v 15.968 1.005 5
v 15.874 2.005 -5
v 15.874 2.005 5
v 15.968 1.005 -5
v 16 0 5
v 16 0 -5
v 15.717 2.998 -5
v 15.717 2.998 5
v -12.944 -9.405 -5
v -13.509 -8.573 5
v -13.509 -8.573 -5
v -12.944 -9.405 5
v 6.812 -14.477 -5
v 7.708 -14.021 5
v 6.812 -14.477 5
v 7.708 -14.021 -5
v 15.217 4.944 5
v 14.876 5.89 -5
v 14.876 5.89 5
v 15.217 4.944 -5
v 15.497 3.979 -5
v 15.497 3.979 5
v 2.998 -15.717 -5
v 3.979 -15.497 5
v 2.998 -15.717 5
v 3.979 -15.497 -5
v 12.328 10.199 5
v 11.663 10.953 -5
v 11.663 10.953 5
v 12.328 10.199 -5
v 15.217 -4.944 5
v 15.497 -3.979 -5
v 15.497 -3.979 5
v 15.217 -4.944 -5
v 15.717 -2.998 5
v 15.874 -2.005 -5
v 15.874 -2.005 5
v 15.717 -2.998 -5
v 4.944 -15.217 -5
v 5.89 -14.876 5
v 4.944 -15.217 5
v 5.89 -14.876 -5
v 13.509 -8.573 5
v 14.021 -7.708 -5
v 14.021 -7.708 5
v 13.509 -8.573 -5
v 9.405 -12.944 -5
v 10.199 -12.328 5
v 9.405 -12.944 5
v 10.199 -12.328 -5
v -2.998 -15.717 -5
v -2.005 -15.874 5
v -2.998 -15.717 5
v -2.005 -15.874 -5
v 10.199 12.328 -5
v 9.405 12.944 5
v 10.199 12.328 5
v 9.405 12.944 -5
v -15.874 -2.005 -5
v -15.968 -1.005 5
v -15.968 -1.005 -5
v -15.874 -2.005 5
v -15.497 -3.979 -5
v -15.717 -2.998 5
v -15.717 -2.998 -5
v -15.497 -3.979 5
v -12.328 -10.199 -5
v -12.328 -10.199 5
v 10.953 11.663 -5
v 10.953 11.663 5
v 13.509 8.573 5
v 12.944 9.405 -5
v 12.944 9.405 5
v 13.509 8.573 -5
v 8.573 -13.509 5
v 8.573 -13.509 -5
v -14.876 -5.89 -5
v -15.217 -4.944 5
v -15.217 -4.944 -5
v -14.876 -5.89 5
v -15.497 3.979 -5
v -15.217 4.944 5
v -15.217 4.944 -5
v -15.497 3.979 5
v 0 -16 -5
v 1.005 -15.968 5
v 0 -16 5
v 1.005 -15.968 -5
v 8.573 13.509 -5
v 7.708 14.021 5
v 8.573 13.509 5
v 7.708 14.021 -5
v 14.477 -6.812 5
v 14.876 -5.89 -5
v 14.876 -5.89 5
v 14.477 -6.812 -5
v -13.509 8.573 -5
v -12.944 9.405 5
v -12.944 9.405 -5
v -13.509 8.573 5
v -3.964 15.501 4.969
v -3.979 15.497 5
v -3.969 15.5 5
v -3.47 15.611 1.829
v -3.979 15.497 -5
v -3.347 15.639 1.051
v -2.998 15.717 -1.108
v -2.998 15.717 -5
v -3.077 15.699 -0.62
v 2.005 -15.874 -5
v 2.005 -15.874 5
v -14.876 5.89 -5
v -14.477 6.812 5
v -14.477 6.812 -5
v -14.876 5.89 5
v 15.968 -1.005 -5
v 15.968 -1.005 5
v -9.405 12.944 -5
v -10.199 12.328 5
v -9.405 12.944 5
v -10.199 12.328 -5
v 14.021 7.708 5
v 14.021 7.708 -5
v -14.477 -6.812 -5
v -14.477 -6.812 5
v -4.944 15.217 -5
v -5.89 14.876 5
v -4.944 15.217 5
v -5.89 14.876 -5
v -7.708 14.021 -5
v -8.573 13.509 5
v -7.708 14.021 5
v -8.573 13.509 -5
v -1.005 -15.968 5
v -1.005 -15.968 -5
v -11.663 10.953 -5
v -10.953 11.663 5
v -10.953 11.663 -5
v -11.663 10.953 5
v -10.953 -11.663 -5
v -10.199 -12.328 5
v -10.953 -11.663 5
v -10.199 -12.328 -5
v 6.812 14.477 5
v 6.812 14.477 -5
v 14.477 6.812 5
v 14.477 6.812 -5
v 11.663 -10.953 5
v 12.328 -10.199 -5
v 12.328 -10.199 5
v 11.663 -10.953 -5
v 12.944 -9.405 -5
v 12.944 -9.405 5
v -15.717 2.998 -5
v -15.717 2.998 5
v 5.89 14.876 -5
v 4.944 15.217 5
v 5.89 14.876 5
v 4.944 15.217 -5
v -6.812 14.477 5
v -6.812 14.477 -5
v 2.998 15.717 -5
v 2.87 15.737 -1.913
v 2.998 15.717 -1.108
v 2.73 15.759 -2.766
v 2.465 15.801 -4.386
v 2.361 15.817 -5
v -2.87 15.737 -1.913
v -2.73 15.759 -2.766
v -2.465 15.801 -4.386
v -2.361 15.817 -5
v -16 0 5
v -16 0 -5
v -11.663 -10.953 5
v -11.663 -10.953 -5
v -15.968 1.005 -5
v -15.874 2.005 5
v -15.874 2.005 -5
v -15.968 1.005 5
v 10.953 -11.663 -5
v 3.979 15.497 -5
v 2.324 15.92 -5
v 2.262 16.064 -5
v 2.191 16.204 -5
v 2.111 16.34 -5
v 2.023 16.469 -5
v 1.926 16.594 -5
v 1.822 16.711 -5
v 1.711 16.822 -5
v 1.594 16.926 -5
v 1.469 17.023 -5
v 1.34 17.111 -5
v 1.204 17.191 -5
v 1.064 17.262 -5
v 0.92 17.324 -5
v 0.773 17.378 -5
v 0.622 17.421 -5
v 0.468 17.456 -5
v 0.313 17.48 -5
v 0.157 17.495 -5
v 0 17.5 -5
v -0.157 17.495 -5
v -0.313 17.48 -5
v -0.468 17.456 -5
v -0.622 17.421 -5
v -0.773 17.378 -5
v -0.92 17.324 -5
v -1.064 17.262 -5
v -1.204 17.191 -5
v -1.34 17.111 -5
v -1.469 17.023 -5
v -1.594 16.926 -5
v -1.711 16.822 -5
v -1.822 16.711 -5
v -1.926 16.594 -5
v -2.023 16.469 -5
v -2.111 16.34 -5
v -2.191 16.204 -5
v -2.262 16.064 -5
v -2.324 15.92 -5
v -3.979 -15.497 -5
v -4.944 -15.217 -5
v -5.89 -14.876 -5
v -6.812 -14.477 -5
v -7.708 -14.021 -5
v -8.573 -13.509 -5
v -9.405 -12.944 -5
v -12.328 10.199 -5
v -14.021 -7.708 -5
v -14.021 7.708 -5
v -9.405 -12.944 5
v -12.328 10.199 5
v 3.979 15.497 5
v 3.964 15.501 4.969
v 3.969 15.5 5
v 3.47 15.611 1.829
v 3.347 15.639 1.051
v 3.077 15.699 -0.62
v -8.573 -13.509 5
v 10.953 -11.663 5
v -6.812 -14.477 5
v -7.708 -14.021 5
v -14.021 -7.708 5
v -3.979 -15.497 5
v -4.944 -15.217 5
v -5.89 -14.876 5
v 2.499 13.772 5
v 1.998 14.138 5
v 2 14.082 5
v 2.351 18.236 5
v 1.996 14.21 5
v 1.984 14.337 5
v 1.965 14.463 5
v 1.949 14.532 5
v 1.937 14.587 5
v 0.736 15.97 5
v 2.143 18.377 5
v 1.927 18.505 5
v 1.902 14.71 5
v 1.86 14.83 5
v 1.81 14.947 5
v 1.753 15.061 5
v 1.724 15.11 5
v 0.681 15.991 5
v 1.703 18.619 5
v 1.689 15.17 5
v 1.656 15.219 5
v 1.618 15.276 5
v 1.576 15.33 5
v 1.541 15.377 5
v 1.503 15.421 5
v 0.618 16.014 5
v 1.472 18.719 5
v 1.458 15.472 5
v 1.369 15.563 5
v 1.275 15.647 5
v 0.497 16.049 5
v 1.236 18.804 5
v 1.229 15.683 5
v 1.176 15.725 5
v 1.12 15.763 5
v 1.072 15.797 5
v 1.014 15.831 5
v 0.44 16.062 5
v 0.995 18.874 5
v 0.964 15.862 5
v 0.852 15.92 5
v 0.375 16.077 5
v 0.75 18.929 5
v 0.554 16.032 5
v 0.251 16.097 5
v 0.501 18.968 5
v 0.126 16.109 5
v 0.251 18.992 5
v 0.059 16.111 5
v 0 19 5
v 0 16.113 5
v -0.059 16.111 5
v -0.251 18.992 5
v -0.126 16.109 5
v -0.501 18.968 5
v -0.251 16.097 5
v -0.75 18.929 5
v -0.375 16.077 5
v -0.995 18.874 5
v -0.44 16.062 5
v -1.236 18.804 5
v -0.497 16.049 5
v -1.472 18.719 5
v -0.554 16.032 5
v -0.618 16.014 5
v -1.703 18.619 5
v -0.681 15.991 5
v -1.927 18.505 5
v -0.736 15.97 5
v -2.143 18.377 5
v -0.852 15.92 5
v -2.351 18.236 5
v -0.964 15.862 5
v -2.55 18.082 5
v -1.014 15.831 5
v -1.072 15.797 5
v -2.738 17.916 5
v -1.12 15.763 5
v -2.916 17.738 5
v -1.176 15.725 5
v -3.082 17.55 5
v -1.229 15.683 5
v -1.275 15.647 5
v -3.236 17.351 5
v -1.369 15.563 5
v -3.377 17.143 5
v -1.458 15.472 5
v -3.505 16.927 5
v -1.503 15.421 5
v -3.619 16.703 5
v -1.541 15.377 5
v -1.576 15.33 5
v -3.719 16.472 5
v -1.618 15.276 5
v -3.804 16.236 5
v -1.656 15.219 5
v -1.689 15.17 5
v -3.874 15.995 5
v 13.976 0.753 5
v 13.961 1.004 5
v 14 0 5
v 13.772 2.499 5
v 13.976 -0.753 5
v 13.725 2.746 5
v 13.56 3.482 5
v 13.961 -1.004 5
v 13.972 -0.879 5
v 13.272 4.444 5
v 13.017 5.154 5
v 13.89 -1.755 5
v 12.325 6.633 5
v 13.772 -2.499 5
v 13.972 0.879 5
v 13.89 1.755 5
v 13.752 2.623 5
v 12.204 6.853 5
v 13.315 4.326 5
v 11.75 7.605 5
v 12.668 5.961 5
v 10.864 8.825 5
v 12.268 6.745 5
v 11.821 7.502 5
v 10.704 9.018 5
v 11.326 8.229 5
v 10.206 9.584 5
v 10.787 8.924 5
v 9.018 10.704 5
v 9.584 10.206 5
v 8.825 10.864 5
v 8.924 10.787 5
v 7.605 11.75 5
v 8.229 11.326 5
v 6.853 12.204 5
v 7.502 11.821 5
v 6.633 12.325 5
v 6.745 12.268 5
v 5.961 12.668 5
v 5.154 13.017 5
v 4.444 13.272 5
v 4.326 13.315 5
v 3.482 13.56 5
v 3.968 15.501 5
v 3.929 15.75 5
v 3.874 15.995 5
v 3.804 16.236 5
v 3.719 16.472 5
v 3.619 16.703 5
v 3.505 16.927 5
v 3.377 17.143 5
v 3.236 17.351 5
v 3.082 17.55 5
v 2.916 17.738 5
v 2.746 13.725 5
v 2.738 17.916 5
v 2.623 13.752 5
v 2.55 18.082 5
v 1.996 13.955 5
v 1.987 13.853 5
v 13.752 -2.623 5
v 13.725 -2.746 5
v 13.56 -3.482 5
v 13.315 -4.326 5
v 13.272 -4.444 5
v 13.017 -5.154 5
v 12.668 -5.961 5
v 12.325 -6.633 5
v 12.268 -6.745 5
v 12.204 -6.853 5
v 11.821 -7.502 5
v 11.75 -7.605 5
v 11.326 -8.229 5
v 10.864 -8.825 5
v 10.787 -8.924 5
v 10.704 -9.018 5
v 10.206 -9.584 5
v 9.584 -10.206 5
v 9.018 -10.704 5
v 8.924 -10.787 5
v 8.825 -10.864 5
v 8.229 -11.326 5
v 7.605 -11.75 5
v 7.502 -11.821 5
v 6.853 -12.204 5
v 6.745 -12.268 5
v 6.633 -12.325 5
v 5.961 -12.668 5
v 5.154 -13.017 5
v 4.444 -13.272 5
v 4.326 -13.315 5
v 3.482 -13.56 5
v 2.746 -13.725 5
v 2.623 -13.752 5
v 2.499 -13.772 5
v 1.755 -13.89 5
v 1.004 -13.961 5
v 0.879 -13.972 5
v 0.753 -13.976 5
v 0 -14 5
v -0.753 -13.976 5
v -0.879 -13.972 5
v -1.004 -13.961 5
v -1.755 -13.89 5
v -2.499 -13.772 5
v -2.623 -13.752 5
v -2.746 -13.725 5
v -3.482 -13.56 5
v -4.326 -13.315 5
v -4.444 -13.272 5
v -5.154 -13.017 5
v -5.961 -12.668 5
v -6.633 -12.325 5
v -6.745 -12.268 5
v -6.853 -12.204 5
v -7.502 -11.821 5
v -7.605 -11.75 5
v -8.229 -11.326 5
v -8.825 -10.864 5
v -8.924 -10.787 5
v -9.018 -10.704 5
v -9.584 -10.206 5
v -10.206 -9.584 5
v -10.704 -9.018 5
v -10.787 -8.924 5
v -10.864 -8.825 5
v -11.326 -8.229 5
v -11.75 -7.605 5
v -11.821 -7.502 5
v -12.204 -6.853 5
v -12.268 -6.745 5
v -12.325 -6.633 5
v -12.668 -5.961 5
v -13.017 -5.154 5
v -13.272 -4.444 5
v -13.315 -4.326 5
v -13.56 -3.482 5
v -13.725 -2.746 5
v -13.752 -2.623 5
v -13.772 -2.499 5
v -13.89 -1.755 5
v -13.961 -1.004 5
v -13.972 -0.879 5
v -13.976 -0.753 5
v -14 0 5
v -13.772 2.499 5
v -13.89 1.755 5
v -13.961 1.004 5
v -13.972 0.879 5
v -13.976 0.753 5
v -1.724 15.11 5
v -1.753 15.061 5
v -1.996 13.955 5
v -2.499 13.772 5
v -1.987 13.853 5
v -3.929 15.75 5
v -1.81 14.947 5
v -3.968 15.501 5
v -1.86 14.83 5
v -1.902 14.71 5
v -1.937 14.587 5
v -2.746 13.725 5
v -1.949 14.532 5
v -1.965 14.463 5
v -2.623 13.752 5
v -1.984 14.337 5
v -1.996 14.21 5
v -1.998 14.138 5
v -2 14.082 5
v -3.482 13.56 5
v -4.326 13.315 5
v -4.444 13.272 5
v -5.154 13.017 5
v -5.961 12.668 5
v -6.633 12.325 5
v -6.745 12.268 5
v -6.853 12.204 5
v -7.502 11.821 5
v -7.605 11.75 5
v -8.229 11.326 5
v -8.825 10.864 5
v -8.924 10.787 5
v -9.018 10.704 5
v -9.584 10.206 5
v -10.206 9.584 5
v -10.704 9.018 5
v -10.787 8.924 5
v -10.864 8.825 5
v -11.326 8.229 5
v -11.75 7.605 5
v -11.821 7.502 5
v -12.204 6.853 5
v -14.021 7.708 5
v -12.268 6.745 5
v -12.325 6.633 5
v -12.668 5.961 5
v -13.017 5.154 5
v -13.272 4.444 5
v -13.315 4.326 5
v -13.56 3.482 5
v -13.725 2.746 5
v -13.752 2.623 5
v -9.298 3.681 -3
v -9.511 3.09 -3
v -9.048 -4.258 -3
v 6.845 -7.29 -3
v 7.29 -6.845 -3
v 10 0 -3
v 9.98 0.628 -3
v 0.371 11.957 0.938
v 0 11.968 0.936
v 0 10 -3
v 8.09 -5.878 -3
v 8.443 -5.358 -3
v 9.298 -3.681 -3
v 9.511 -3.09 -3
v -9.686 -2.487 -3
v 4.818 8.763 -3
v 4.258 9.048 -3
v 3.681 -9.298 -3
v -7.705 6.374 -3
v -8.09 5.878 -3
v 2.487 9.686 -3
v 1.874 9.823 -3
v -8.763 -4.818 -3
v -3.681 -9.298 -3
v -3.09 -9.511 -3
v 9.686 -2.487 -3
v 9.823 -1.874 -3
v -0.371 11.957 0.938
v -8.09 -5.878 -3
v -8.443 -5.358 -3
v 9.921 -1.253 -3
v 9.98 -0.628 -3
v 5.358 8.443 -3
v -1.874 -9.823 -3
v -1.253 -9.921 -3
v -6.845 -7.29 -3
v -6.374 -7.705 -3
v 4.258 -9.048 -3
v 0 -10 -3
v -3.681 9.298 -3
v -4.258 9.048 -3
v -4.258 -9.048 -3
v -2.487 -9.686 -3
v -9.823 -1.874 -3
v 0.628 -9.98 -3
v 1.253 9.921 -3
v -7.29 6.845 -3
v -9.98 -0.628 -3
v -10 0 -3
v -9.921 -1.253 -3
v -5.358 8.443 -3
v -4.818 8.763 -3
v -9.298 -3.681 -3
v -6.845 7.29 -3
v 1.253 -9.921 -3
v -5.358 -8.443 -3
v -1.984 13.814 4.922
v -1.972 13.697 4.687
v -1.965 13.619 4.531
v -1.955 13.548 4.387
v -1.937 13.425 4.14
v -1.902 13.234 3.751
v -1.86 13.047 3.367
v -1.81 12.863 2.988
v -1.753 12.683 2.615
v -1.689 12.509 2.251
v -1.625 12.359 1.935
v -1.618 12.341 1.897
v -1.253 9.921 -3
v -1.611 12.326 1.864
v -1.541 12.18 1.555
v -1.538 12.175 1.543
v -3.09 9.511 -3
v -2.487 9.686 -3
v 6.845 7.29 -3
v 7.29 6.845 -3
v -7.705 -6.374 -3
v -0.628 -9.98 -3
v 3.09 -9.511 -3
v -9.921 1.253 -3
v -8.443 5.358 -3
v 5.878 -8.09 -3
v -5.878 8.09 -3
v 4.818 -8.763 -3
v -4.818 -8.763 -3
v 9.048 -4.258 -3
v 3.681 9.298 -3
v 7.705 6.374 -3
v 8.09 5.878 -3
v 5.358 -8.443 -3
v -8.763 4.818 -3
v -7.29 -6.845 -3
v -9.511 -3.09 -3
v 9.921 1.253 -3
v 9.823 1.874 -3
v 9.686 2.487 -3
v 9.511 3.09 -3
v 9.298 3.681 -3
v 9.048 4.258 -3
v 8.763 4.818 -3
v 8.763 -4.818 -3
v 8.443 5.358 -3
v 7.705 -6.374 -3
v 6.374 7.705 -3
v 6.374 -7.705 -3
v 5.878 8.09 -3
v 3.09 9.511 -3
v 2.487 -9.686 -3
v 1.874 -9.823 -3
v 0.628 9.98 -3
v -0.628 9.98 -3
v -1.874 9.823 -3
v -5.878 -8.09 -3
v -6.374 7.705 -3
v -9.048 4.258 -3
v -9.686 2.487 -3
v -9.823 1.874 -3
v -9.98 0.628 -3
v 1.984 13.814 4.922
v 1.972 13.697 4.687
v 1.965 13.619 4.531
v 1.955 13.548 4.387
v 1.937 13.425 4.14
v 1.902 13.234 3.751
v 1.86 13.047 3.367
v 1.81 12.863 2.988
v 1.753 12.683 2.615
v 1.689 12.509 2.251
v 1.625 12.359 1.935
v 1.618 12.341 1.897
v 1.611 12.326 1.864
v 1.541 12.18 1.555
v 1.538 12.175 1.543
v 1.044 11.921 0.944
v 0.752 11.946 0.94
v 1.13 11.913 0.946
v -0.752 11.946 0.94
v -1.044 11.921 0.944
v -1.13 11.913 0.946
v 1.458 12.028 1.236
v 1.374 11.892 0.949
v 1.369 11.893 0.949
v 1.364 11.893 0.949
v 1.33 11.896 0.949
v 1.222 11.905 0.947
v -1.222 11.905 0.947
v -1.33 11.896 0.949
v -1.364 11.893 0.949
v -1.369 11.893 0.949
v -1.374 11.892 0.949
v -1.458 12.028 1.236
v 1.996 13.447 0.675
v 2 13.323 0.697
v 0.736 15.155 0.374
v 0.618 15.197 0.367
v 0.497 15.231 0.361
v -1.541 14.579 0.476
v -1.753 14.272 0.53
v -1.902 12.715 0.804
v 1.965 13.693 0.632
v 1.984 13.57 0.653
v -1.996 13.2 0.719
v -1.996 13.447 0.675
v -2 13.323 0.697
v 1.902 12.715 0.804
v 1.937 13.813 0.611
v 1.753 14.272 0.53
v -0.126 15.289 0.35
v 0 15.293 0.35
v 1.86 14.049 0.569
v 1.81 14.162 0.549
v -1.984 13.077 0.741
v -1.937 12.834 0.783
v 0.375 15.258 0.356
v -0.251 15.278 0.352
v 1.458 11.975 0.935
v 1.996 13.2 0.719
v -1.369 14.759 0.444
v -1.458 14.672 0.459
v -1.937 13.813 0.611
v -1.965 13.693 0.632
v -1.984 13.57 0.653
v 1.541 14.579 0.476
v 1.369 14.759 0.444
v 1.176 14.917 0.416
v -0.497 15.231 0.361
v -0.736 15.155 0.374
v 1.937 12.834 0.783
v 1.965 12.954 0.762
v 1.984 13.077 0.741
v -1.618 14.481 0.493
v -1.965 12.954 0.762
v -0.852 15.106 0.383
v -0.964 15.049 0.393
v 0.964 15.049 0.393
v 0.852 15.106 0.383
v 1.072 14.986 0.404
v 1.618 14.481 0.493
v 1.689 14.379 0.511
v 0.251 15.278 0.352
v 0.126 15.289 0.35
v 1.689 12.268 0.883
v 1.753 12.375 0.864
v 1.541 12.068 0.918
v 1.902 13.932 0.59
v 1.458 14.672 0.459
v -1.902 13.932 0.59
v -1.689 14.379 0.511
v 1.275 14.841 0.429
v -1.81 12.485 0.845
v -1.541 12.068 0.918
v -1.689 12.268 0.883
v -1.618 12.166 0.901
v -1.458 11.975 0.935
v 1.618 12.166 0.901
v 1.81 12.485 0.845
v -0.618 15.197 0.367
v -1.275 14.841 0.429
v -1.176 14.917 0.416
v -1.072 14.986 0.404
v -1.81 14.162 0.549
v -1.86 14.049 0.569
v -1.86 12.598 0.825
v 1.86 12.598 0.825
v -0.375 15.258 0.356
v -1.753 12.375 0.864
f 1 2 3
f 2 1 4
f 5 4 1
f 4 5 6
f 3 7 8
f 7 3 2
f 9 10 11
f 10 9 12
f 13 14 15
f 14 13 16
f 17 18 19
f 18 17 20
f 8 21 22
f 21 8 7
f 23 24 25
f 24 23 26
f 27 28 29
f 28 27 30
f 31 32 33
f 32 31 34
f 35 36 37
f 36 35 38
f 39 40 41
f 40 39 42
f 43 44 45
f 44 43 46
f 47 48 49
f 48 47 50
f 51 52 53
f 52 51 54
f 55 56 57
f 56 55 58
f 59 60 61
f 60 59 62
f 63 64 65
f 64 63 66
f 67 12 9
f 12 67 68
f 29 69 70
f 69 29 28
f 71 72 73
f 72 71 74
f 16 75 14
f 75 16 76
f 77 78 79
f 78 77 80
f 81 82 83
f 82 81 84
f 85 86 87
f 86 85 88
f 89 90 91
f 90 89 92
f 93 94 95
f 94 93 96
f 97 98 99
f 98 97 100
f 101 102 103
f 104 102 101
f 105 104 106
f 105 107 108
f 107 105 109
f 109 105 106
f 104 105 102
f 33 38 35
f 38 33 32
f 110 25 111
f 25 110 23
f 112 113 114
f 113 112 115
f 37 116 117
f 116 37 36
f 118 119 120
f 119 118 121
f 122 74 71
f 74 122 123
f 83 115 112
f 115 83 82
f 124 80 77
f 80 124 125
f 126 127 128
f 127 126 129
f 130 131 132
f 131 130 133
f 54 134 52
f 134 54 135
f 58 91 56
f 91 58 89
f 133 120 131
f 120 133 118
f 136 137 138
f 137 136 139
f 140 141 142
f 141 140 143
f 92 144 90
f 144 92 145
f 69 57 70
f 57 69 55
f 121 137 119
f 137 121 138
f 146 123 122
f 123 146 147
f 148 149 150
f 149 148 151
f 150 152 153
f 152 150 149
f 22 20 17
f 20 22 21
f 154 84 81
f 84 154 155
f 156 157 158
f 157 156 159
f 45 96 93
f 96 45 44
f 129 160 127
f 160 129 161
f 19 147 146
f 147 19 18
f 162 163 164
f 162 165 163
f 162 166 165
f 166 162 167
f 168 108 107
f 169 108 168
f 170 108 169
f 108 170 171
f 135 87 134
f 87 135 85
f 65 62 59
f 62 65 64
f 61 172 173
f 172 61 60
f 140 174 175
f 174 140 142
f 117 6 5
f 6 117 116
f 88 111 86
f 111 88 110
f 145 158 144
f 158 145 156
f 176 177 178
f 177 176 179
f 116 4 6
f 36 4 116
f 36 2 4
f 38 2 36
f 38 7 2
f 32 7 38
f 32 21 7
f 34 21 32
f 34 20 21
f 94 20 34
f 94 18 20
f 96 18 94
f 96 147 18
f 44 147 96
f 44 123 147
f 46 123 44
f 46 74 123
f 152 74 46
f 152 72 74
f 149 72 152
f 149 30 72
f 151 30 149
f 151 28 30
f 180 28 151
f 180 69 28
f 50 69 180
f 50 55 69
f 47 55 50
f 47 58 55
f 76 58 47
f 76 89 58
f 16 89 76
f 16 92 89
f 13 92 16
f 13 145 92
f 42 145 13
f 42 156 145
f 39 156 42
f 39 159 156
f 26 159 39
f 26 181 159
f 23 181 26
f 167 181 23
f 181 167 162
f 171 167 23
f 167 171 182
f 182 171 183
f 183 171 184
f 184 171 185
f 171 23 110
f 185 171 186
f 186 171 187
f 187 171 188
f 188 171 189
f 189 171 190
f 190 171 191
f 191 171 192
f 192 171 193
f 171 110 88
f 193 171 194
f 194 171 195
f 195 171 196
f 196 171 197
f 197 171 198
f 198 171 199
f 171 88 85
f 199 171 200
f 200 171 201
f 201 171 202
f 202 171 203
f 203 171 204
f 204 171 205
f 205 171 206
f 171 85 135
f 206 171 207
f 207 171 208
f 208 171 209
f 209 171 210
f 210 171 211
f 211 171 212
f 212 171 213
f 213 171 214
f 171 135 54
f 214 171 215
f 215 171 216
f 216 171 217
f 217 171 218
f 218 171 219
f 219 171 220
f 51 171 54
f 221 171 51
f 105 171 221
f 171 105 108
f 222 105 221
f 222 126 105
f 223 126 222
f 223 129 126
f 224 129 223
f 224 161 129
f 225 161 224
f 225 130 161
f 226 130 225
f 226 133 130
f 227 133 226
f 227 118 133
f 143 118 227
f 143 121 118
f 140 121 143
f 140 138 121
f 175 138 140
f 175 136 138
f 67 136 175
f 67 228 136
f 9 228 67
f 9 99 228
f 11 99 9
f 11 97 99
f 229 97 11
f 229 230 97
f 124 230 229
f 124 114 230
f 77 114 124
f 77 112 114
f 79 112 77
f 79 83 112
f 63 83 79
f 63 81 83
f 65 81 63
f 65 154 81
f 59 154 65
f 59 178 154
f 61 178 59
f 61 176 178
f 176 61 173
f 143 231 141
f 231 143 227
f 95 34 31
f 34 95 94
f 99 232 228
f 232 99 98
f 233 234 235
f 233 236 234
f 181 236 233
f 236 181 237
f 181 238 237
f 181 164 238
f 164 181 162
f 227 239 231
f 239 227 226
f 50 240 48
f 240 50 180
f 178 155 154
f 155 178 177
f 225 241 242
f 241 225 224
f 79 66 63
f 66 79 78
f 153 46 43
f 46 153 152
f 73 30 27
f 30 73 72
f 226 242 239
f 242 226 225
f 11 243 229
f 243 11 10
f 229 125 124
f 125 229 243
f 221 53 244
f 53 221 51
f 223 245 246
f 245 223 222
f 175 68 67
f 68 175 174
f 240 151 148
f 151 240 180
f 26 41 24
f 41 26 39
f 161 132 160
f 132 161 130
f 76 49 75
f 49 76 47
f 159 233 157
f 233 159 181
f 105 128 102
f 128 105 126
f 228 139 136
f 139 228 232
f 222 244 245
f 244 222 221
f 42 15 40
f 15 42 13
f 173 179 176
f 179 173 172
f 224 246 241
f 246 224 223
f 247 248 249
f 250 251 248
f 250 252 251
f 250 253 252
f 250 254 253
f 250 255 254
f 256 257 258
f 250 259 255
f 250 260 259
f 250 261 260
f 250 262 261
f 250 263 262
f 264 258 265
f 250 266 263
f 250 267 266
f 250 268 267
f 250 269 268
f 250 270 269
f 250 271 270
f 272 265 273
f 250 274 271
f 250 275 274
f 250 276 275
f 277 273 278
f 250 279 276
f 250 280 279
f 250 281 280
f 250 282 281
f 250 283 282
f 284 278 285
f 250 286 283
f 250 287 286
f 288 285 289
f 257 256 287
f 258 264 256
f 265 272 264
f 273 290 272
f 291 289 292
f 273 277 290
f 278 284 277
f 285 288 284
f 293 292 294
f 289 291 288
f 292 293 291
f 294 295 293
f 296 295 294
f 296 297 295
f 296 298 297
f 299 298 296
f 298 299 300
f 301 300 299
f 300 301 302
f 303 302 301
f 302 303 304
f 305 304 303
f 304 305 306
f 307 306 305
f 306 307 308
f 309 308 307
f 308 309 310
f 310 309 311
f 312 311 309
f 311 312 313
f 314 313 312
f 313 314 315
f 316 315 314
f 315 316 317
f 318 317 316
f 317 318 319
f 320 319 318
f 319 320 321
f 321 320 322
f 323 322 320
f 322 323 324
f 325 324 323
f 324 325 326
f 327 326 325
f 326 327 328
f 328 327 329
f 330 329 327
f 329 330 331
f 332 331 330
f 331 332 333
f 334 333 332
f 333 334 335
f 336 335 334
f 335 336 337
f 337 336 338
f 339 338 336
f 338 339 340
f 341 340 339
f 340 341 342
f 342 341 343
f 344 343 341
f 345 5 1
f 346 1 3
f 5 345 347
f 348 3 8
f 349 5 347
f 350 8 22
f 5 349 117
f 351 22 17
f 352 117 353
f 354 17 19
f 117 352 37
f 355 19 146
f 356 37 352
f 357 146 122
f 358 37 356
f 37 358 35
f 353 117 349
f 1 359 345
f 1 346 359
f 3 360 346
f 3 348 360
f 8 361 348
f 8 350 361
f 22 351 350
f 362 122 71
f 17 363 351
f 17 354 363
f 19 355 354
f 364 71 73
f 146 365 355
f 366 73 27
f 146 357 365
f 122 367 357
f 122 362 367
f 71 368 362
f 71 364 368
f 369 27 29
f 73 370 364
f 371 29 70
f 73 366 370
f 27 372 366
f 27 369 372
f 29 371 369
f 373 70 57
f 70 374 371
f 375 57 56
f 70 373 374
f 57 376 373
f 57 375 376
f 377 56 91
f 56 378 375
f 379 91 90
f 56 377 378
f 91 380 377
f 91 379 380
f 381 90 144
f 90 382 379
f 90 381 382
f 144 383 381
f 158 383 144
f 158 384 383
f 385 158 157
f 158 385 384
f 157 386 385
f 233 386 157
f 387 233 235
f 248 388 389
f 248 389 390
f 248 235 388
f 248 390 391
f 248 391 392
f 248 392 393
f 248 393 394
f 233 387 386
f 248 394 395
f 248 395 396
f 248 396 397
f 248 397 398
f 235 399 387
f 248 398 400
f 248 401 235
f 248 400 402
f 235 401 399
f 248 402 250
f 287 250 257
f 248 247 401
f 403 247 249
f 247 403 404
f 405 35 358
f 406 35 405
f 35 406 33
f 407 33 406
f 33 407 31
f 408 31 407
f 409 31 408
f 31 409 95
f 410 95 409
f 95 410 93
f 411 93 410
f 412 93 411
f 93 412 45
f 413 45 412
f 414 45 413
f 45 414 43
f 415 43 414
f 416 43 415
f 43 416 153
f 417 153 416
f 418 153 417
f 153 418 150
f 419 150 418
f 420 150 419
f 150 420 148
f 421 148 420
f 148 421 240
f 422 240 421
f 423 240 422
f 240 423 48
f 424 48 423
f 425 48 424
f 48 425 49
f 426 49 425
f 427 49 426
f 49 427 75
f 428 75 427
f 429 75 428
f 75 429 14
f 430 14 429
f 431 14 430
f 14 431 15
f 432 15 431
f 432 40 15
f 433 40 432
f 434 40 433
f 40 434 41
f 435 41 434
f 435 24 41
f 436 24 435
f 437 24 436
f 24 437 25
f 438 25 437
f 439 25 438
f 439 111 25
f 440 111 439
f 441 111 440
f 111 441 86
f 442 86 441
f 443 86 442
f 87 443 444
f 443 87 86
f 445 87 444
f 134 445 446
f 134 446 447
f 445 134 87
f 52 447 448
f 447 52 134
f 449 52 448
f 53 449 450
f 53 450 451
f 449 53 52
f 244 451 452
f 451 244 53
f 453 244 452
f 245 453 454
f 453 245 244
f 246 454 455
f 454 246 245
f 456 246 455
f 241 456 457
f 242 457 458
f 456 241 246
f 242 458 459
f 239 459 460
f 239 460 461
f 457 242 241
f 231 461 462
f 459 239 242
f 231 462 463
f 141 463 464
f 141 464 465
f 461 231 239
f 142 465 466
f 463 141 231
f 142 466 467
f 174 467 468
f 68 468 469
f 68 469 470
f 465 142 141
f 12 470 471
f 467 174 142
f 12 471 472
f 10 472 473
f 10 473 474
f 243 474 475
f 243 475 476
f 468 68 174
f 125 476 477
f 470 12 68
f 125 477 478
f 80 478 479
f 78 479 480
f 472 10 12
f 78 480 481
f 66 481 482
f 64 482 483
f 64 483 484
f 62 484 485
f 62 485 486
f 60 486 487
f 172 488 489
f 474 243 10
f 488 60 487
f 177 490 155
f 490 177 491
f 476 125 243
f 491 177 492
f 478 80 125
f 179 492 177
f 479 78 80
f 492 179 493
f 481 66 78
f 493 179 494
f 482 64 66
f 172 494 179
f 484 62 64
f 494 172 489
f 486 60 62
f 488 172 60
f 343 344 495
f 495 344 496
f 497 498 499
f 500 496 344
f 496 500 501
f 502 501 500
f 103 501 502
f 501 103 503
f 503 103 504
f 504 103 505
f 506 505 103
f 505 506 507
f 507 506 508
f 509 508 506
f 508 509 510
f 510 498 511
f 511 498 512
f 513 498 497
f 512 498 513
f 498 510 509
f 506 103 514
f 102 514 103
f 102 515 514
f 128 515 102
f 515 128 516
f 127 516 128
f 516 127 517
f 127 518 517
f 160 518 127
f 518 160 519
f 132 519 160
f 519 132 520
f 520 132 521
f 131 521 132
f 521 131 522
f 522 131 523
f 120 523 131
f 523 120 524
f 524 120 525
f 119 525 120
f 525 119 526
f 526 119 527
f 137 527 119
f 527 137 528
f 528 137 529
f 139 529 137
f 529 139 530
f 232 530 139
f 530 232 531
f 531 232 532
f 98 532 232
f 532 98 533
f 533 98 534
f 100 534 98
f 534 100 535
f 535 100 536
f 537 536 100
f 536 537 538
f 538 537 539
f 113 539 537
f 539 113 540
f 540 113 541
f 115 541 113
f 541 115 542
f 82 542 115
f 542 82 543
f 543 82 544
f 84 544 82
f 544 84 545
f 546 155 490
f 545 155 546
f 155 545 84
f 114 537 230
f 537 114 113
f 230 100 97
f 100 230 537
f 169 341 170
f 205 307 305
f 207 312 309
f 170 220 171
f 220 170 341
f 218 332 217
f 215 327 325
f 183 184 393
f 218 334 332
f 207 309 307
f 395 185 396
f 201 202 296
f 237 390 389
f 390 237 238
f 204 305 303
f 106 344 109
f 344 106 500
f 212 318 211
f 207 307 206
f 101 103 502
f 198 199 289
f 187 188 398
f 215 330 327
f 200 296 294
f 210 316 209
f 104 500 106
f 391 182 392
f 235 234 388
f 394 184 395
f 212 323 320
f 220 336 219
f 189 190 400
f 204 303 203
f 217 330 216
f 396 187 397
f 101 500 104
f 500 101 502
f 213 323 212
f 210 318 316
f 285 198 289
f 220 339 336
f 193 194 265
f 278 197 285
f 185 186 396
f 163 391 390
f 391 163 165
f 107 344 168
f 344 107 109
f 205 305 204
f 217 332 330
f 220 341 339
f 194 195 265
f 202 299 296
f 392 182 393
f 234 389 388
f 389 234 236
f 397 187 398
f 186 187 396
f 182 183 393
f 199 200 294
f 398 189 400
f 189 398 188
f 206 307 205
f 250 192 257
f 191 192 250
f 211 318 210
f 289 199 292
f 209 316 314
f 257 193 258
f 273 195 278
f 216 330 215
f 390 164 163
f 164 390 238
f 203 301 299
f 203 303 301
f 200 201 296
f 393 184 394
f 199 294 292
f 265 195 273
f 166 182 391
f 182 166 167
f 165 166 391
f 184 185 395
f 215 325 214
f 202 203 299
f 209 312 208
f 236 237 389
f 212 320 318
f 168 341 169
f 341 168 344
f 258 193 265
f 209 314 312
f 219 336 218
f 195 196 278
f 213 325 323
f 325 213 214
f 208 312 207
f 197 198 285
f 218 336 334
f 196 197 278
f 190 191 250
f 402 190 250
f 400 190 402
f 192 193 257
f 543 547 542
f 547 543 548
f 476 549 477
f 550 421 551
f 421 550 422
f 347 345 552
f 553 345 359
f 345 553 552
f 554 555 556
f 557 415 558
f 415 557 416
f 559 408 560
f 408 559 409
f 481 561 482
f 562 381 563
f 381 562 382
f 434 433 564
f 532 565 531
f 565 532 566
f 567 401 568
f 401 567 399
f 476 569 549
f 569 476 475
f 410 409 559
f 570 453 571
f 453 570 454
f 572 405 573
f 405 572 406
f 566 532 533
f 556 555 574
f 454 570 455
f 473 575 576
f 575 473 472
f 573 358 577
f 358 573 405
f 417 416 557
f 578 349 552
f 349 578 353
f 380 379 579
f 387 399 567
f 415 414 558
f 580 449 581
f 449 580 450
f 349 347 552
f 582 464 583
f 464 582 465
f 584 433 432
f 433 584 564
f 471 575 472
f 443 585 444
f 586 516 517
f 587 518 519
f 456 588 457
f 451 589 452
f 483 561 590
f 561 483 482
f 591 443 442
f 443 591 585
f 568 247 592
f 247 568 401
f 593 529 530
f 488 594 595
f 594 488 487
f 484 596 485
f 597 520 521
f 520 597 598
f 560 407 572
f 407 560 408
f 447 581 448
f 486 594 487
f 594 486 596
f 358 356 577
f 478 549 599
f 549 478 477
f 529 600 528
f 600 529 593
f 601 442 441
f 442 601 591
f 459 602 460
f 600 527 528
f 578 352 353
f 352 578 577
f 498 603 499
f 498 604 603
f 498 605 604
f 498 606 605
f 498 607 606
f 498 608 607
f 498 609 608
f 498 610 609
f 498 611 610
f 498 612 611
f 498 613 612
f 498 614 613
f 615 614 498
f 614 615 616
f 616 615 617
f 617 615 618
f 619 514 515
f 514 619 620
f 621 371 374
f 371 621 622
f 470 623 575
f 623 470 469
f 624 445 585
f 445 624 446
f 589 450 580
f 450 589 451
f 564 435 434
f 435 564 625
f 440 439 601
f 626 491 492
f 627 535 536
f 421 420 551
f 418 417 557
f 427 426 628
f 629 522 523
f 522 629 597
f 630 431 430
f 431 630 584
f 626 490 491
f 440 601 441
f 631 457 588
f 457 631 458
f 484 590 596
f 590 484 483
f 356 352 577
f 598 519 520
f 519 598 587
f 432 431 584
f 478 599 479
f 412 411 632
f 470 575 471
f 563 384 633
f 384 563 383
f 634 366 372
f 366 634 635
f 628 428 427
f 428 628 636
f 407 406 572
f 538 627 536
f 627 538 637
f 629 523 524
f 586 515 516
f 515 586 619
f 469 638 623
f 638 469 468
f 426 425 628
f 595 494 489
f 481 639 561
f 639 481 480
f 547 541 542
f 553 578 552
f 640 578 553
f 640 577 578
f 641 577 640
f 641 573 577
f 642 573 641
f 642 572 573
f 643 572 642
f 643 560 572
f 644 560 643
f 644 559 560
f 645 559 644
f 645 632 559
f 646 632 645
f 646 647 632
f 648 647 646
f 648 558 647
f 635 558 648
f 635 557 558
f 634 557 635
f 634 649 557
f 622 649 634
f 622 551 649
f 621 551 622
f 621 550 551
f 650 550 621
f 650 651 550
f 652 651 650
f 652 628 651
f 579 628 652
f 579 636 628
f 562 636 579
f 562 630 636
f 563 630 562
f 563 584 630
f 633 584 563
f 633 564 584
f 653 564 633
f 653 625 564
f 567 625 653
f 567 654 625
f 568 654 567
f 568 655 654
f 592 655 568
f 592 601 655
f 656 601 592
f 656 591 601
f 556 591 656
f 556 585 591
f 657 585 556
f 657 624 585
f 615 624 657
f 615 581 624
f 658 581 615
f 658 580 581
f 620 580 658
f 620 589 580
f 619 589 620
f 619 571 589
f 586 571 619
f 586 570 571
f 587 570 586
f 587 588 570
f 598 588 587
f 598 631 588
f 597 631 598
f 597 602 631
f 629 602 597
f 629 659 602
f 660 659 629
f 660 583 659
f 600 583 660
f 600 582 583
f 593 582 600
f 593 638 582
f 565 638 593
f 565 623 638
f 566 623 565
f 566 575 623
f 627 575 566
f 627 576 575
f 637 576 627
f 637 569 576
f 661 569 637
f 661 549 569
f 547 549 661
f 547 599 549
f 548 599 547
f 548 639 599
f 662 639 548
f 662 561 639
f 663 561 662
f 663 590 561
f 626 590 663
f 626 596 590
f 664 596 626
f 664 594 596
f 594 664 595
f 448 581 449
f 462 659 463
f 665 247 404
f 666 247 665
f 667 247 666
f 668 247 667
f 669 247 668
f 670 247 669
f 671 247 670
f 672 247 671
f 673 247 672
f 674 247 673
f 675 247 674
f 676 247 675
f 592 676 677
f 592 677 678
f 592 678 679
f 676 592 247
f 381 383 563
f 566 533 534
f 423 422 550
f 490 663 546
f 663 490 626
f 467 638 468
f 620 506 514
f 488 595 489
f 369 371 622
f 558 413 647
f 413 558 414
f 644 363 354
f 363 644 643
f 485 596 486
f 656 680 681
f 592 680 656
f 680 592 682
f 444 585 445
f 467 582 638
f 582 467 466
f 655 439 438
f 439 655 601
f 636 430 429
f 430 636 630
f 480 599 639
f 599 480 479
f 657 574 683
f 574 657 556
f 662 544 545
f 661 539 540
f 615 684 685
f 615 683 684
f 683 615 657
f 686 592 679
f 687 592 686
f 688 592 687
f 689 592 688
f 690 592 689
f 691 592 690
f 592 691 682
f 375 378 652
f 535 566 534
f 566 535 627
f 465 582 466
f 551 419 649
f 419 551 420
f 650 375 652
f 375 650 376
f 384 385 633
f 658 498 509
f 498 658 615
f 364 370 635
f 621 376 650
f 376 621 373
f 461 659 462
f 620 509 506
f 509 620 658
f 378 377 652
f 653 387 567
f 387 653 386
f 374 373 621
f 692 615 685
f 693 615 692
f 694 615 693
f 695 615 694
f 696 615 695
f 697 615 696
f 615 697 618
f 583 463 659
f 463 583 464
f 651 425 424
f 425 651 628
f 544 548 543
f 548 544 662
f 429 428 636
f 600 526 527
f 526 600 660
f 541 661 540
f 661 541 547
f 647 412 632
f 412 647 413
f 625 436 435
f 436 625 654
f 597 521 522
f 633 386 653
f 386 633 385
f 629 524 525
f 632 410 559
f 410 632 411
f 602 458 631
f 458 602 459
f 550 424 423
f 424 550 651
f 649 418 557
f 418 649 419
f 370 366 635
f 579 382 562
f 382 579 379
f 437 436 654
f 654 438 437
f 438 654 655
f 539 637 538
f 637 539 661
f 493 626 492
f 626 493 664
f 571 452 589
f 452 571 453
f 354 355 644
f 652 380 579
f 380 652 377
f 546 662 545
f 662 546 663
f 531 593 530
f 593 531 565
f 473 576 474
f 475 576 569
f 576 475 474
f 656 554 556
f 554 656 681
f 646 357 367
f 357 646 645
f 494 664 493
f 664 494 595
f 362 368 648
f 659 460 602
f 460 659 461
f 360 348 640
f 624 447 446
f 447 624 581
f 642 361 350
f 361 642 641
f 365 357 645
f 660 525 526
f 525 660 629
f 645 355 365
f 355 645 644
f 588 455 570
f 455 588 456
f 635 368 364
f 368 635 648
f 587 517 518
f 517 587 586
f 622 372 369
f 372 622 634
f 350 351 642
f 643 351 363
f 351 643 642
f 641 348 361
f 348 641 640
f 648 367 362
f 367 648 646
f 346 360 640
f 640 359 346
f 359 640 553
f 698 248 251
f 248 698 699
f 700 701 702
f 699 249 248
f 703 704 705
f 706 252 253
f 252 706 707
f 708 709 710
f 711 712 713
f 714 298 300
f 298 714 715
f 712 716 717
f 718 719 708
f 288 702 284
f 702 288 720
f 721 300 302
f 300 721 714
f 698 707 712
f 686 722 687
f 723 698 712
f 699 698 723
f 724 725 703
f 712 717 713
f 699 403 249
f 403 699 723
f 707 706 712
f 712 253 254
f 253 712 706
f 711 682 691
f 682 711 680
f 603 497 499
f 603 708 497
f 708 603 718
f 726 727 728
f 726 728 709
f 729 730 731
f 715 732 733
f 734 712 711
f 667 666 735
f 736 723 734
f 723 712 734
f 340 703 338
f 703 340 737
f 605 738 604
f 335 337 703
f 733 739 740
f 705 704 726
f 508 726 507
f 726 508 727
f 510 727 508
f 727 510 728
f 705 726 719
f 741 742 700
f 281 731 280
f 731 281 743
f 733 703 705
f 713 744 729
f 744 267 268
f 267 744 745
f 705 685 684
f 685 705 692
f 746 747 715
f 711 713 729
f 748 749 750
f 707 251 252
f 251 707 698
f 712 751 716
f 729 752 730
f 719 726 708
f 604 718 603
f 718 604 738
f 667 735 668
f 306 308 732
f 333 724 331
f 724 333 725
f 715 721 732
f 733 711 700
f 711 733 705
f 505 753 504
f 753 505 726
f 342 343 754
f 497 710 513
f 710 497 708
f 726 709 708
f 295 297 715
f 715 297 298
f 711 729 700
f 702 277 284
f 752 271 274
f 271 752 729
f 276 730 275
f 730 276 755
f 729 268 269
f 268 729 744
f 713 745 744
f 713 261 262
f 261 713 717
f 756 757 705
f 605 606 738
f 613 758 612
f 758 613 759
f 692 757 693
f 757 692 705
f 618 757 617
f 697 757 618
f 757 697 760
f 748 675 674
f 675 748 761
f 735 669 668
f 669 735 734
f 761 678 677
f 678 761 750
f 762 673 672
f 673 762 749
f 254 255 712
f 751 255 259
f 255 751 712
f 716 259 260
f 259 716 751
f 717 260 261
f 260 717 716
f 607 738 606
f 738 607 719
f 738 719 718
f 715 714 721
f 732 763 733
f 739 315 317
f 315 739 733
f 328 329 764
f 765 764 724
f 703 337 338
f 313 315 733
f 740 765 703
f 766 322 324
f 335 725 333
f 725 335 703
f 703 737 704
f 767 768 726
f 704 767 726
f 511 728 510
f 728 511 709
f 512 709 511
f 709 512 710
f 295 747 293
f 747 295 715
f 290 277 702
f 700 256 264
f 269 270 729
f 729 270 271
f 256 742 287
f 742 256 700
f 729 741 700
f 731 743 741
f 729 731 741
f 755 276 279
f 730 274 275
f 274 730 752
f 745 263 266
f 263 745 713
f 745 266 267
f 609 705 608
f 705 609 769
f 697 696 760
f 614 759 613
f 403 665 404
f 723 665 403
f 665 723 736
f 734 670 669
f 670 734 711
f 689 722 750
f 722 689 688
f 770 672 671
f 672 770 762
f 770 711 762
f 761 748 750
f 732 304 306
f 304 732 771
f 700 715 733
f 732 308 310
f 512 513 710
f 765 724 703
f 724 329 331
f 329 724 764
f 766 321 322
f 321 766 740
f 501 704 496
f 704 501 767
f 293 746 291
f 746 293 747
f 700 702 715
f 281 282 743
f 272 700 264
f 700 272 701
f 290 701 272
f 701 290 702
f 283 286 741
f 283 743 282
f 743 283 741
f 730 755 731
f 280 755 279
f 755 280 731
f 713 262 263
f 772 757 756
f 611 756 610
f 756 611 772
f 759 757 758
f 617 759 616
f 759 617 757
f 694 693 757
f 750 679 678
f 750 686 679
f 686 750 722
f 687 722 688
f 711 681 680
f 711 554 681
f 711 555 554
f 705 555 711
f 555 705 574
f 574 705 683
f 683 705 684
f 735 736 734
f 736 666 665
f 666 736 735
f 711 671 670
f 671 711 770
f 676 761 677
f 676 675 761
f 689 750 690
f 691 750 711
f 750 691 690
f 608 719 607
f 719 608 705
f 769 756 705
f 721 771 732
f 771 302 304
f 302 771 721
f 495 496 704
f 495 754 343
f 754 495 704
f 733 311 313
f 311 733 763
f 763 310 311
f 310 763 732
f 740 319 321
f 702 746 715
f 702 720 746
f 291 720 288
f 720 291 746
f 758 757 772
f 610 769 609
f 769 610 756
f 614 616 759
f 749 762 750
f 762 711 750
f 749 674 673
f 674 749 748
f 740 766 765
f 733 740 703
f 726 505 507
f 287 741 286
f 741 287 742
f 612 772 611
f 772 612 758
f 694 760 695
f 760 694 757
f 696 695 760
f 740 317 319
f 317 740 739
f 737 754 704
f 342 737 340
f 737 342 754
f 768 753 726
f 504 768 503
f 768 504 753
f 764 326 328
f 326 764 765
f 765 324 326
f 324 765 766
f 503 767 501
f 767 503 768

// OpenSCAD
thick  = 2;
height = 10;

radiusDown = 20.0 /2;
radiusUp   = 30.0 / 2; 

jetDown = 5.0 /2;
jetUp = 8.0 /2;

$fn = 100;

module tray()
{
    difference()
    {
        difference()
        { 
         union()
         {   
          cylinder(h= height, r=radiusUp + (thick/2), center=true);
          translate([0, radiusUp, 0]) cylinder(h= height, r1= jetDown, r2 = jetUp, center=true);   
         }     
         translate([0,0, thick]) #cylinder(h=height, r1=radiusDown, r2=radiusUp, center=true);
         
         // Jet
         rotate([-10, 0, 0])
         translate([0, radiusUp - thick, height - thick]) 
          #cylinder(h= height, r= jetUp - thick, center=true);
        }
    }
}

tray();
